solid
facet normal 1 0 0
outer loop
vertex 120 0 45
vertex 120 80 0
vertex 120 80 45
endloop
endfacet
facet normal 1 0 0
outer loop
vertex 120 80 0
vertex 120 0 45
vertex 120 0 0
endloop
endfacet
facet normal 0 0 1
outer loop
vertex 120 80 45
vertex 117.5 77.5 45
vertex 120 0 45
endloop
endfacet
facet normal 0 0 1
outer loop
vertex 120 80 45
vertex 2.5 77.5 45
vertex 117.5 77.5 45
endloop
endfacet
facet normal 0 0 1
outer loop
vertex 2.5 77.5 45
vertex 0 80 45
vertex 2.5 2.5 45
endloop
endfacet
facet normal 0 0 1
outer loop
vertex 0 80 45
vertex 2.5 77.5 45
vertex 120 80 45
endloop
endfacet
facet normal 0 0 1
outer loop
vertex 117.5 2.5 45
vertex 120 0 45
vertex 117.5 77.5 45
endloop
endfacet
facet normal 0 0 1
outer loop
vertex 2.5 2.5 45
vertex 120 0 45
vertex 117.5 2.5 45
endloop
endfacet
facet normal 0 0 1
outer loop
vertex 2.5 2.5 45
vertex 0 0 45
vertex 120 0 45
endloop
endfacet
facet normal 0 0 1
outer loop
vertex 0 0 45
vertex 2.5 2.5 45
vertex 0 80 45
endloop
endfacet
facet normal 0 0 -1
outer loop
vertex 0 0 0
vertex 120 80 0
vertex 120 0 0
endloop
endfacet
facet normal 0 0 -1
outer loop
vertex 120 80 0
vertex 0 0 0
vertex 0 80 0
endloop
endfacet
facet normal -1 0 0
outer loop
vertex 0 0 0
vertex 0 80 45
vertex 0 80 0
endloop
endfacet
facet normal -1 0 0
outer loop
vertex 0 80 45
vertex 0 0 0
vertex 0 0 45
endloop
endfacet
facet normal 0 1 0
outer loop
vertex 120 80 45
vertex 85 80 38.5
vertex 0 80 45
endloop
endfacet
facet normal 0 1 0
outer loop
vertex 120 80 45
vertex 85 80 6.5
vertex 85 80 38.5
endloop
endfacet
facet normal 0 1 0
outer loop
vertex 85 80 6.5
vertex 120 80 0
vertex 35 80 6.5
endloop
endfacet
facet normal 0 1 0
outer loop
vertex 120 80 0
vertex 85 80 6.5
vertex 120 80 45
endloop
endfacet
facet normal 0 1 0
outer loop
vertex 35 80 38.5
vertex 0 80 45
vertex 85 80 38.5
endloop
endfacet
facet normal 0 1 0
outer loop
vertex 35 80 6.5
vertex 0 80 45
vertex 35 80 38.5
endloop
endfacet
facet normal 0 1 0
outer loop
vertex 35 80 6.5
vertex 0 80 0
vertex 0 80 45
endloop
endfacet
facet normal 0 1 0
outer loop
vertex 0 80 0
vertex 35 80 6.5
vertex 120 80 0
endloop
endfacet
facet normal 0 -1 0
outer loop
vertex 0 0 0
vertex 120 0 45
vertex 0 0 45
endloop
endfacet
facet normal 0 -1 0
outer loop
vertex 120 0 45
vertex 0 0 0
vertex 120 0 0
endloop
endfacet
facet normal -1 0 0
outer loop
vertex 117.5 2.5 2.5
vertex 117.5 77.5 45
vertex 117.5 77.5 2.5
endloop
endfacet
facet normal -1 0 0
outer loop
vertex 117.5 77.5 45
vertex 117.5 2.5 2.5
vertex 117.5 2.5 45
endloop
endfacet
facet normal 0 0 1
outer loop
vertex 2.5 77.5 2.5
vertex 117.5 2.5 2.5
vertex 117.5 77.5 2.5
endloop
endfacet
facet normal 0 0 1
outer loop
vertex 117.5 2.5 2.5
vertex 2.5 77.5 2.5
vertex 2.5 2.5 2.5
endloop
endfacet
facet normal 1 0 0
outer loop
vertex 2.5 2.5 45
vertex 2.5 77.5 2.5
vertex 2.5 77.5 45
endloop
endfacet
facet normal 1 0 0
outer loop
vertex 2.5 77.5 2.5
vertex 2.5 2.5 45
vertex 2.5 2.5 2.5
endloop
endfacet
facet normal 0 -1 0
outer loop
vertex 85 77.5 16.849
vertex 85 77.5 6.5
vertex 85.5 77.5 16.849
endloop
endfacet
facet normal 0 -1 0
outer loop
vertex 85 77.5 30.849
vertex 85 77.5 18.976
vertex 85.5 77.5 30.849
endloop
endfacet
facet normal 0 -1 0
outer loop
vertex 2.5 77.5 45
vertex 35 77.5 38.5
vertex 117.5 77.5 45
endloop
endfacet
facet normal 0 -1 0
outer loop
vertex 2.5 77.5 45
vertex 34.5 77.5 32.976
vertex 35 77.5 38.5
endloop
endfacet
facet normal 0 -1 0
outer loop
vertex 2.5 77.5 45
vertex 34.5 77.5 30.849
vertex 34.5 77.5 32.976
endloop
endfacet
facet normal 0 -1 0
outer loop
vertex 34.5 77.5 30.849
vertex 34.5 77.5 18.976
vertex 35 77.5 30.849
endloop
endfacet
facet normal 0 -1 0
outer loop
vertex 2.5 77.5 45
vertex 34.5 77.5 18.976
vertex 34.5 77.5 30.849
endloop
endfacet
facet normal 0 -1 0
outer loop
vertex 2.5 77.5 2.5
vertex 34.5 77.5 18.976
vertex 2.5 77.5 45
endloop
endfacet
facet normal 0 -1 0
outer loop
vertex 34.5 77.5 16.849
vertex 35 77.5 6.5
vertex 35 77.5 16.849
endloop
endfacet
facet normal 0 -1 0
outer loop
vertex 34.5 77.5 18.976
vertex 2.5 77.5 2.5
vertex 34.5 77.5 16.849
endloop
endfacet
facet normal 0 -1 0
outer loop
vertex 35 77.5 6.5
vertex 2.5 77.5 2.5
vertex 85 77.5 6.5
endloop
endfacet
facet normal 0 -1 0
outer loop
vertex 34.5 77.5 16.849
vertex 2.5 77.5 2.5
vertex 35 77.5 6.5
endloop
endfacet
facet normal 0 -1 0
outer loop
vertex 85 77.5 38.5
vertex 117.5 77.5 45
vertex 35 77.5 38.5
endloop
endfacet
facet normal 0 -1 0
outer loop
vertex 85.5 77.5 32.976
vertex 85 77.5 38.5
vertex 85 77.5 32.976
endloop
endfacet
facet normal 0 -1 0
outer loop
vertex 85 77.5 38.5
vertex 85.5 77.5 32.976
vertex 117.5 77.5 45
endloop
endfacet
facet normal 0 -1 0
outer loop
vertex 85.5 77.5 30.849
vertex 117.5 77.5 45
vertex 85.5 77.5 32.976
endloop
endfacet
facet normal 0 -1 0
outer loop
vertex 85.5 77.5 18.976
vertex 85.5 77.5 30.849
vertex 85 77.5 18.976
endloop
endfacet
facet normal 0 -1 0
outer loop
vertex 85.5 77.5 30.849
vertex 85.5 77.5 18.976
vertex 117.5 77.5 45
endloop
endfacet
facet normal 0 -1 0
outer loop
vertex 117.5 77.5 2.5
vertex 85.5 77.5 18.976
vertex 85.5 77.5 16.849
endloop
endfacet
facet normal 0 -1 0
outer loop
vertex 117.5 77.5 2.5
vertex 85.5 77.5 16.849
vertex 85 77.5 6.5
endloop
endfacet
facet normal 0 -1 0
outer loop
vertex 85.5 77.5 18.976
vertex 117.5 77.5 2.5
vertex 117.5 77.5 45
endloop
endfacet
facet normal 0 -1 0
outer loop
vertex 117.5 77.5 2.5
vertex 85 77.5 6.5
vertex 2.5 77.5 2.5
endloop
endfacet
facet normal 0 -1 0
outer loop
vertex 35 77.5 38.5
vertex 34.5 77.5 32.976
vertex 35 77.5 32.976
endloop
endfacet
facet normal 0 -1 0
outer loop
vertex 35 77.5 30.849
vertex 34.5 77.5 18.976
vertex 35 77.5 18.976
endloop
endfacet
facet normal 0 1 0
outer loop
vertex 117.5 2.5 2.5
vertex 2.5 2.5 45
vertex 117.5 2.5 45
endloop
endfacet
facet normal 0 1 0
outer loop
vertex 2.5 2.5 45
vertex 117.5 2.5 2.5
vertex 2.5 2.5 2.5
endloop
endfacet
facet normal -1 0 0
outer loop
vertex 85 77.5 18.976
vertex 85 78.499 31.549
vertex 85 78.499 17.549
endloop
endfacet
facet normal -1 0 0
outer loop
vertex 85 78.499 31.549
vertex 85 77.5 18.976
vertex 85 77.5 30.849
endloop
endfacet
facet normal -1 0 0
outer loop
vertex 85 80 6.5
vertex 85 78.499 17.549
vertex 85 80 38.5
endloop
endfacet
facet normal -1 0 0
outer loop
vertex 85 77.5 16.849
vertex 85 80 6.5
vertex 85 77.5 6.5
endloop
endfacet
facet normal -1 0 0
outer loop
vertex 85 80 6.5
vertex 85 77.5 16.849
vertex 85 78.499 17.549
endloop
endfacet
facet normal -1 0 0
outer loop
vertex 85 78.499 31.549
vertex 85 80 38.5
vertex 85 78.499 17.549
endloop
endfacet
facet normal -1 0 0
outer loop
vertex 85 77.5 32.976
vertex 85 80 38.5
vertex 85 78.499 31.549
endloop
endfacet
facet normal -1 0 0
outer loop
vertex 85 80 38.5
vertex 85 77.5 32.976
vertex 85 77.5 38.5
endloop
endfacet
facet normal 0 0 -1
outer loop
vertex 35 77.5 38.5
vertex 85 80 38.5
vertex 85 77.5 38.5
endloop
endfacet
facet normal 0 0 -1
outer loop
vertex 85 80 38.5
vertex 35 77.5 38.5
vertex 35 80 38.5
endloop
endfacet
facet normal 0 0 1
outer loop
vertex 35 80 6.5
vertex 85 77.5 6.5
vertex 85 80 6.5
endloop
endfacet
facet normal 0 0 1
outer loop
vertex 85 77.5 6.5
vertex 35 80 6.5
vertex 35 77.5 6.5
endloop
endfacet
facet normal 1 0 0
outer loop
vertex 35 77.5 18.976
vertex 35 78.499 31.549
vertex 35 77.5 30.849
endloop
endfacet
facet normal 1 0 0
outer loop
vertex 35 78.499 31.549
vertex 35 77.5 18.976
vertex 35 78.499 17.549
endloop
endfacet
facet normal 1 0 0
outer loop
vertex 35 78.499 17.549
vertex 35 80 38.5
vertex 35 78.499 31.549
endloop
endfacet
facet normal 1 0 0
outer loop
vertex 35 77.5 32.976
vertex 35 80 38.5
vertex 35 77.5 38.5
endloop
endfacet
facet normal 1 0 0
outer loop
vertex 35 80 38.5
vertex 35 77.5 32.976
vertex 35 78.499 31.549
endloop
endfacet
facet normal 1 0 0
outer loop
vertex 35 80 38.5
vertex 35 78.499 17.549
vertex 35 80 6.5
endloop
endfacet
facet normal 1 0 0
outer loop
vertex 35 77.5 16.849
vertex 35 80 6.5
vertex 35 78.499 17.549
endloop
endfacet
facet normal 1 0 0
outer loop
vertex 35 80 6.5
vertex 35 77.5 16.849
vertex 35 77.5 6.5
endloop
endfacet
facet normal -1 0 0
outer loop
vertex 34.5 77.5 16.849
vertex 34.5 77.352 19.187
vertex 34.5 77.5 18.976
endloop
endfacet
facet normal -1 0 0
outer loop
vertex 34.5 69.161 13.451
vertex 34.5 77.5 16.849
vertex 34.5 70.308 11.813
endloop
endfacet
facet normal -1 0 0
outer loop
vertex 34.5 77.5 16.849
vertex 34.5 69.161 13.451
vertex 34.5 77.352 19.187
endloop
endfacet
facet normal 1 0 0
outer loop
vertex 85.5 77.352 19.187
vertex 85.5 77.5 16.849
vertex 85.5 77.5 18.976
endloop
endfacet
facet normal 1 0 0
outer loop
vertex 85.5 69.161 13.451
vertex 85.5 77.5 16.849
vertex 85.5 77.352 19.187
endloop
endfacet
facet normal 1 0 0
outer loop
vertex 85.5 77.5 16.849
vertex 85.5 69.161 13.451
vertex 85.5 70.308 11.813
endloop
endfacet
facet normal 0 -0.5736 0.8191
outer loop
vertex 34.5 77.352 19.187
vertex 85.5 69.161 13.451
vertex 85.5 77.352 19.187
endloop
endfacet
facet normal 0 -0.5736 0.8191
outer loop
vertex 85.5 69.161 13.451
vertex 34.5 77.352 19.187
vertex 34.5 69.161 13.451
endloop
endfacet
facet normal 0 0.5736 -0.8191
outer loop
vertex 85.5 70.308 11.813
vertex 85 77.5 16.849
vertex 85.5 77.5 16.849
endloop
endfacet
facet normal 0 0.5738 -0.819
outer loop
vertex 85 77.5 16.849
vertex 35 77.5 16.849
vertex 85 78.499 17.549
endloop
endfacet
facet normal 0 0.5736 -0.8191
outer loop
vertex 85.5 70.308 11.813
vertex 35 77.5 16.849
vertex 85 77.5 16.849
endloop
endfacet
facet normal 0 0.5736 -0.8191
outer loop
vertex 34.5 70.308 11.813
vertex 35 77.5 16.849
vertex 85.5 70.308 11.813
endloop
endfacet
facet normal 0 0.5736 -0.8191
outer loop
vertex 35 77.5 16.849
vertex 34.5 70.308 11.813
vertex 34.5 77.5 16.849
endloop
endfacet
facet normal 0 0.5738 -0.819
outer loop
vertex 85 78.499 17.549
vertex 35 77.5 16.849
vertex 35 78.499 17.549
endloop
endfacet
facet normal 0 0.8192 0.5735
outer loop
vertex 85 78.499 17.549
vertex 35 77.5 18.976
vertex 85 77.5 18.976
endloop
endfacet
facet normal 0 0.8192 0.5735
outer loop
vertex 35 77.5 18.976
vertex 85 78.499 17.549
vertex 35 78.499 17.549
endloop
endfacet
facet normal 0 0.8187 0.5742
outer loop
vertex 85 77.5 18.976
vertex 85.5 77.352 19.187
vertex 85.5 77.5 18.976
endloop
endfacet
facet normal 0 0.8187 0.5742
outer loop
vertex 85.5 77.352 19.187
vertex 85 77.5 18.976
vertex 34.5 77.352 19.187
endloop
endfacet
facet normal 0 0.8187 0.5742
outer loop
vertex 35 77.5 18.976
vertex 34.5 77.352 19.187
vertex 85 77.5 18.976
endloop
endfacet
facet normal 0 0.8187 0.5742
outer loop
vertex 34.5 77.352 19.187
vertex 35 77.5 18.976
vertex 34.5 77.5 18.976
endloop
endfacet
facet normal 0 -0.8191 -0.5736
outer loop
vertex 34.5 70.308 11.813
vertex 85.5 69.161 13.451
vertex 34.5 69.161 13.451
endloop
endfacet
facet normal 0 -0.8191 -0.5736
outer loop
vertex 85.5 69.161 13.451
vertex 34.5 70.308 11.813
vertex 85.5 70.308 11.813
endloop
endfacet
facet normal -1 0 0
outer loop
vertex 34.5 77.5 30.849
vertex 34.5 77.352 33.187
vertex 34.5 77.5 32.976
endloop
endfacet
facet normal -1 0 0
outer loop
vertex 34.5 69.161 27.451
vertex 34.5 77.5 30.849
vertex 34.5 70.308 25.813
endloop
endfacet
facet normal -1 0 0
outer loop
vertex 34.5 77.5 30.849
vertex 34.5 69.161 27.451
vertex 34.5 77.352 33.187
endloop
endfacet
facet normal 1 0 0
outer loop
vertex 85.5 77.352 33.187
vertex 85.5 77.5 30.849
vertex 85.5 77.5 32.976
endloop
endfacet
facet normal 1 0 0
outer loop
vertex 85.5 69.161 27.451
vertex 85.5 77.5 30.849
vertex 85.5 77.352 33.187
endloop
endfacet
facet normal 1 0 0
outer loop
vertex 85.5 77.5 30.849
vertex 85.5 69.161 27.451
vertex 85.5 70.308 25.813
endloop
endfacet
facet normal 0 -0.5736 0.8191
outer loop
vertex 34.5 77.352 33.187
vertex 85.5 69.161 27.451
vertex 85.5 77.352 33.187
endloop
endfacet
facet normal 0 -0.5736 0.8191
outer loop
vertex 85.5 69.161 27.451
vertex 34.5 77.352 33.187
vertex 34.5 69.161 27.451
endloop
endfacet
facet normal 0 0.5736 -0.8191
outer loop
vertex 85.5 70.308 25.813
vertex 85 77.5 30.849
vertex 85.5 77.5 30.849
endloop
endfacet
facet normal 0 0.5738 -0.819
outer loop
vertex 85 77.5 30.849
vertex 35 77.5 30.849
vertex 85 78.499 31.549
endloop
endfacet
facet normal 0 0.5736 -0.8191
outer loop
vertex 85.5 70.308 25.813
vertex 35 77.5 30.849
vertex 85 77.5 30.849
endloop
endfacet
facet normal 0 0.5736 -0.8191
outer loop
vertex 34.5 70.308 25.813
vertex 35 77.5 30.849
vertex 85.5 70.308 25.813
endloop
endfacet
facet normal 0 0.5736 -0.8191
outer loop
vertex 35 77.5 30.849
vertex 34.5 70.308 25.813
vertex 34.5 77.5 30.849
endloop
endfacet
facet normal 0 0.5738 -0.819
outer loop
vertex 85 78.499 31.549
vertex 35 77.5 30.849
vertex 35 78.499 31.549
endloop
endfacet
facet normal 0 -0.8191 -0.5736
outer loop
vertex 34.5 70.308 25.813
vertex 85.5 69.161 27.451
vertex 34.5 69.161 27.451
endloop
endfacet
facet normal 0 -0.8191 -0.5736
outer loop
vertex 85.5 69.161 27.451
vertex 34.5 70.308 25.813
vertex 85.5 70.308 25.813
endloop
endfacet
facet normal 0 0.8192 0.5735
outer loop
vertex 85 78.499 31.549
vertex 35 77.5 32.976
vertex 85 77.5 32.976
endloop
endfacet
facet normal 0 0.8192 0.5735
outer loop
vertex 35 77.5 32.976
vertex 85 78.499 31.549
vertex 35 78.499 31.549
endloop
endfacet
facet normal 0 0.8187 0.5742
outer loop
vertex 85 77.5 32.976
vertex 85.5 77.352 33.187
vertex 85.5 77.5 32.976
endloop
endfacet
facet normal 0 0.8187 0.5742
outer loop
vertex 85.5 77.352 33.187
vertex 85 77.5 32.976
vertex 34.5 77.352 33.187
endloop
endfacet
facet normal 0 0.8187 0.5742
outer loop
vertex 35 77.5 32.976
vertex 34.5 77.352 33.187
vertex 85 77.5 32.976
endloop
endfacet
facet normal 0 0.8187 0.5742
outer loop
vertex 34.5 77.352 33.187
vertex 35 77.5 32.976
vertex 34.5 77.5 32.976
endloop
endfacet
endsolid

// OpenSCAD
$fn = 32;

// ----------------------------------------------------------------------
// Vent box: louvers enclosure
// ----------------------------------------------------------------------

// --- parameters (mm) ---
box_l = 120;              // box length, X
box_w = 80;               // box width, Y
box_h = 45;               // box height, Z
wall_t = 2.5;             // shell wall thickness
win_l = 50;               // vent window width, X
win_h = 32;               // vent window height, Z
slat_t = 2;               // louver slat thickness
slat_d = 10;              // louver slat depth
slat_a = 35;              // louver slat angle, degrees
slat_pitch = 14;          // louver pitch
slat_yc = 73.83;          // slat centreline Y
fit_tol = 0.1;            // tolerance for press fits, mm
free_tol = 0.3;           // tolerance for clearance fits, mm

win_z0 = (box_h - win_h) / 2;  // window lower edge Z
n_slats = 2;  // louver count
slat_z0 = win_z0 + (win_h - (n_slats - 1) * slat_pitch) / 2;

difference() {
  union() {
    difference() {
      cube([box_l, box_w, box_h]);
  translate([wall_t, wall_t, wall_t])
    cube([box_l - 2 * wall_t, box_w - 2 * wall_t, box_h]);
  translate([(box_l - win_l) / 2, box_w - wall_t - 1, win_z0])
    cube([win_l, wall_t + 2, win_h]);
    }
    for (i = [0 : n_slats - 1])
      translate([box_l / 2, slat_yc, slat_z0 + i * slat_pitch])
        rotate([slat_a, 0, 0])
          cube([win_l + 1, slat_d, slat_t], center = true);
  }
}
